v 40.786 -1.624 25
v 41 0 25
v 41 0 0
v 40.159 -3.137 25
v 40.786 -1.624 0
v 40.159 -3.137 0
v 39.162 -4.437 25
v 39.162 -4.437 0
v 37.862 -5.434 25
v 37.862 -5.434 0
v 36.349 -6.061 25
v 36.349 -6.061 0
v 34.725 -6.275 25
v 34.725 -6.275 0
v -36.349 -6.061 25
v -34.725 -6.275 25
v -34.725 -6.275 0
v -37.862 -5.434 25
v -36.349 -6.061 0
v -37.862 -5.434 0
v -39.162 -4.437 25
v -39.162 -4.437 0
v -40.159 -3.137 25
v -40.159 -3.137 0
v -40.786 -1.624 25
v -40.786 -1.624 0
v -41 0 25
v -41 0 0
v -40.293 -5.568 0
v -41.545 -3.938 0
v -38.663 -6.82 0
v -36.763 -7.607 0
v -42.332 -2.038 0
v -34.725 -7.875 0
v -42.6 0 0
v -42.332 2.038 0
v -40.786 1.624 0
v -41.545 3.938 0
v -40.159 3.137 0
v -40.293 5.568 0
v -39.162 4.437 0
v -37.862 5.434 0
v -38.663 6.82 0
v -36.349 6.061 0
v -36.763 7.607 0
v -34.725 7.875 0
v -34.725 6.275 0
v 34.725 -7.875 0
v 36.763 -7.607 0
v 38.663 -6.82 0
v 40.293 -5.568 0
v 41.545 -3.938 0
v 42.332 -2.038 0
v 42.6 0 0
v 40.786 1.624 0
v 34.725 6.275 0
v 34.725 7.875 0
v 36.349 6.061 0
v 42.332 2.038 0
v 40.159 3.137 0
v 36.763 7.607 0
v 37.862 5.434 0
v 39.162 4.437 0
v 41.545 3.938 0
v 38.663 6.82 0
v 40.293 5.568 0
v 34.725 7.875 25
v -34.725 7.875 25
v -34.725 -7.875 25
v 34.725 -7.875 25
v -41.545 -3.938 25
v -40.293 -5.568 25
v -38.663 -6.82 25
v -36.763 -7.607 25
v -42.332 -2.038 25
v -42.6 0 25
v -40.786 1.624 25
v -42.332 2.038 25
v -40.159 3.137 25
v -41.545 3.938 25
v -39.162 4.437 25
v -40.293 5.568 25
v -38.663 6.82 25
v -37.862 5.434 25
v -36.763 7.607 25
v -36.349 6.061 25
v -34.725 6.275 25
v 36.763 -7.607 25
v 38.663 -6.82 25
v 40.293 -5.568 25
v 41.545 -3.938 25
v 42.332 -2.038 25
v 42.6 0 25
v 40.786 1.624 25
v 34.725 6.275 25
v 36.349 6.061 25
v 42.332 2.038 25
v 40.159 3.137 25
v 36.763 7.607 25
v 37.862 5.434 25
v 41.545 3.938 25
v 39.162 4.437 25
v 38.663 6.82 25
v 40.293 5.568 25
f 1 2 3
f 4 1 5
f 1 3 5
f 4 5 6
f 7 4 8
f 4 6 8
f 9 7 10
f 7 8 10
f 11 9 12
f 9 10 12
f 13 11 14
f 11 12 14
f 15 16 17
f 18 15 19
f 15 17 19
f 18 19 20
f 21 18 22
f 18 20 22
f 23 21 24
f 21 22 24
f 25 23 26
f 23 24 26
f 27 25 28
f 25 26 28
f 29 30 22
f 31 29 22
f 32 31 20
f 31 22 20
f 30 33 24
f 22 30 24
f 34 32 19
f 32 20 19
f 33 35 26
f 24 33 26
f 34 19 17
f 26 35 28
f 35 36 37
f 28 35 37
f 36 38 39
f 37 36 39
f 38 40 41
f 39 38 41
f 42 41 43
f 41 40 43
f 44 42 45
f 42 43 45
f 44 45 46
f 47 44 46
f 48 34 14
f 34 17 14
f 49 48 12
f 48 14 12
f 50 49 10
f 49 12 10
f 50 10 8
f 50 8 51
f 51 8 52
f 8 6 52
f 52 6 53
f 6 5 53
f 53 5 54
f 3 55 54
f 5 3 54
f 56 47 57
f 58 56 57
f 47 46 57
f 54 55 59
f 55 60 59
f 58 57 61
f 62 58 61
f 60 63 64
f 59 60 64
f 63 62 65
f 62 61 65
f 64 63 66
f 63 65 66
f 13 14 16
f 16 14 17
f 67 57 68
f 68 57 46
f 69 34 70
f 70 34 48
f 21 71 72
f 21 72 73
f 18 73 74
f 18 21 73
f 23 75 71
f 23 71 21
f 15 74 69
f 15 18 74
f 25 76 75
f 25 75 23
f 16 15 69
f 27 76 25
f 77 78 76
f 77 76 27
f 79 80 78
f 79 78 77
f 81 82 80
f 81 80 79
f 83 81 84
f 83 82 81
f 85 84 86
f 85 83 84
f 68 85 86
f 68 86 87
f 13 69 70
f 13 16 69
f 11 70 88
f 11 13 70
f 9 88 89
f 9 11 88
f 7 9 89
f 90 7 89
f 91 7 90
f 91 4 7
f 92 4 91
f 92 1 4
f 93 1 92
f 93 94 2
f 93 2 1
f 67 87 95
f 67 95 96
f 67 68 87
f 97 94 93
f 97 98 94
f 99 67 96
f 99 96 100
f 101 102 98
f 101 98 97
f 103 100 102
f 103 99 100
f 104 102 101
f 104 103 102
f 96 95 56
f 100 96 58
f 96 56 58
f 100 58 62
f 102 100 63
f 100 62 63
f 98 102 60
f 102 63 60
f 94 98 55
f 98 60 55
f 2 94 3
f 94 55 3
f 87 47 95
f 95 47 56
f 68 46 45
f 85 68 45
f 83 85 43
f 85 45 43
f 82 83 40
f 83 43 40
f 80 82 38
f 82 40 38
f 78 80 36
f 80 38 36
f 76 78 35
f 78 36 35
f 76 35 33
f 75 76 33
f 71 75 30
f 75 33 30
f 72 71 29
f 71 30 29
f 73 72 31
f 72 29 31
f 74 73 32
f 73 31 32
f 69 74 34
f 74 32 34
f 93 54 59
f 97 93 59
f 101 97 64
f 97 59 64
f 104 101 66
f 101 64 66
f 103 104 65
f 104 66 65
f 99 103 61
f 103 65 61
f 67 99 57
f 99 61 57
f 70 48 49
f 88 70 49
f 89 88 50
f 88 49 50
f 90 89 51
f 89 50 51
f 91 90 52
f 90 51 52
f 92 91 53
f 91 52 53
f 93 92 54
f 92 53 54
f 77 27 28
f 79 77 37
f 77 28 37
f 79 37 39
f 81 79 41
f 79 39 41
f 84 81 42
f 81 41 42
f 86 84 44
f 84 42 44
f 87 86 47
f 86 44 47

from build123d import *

# Parameters (mm, degrees)
F1_DEPTH = 25


with BuildPart() as f1:
    # F0 (on Top) → F1 (new body)
    with BuildSketch(Plane.XY):
        with BuildLine():
            Line((-34.725, -7.875), (34.725, -7.875))
            ThreePointArc((34.725, -7.875), (40.293466, -5.568466), (42.6, 0))
            ThreePointArc((42.6, 0), (40.293466, 5.568466), (34.725, 7.875))
            Line((34.725, 7.875), (-34.725, 7.875))
            ThreePointArc((-34.725, 7.875), (-40.293466, 5.568466), (-42.6, 0))
            ThreePointArc((-42.6, 0), (-40.293466, -5.568466), (-34.725, -7.875))
        make_face()
        with BuildLine():
            Line((-34.725, 6.275), (34.725, 6.275))
            ThreePointArc((34.725, 6.275), (39.162095, 4.437095), (41, 0))
            ThreePointArc((41, 0), (39.162095, -4.437095), (34.725, -6.275))
            Line((34.725, -6.275), (-34.725, -6.275))
            ThreePointArc((-34.725, -6.275), (-39.162095, -4.437095), (-41, 0))
            ThreePointArc((-41, 0), (-39.162095, 4.437095), (-34.725, 6.275))
        make_face(mode=Mode.SUBTRACT)
    extrude(amount=F1_DEPTH)


solid = f1.part
